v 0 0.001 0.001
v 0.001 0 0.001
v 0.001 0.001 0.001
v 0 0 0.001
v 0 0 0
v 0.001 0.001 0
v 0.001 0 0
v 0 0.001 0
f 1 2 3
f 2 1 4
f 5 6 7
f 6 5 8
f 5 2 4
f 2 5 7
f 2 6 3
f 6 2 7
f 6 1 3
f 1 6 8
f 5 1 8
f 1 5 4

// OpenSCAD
// t_curve — the parametric frontend, and the dedupe that keeps it finite.

// clang-format off
use <../src/uniTube.scad>;
// clang-format on

// ============================================ a helix
R = 60;
T = 2;
RISE = 40;
h = ut_curve(function(t)[R * cos(360 * T * t), R *sin(360 * T * t), RISE *T *t], n = 160);

assert(len(ut_segs(h)) == 1, "a parametric curve lowers to ONE sampled segment");
assert(ut_seg_kind(ut_segs(h)[0]) == "P", "of kind P");

// A sampled segment measures CHORDS, so it under-reads the true arclength. That
// is the honest cost of an arc-native IR and it is documented, not hidden.
true_len = sqrt(pow(2 * PI * R * T, 2) + pow(RISE * T, 2));
assert(ut_length(h) < true_len, "chords are shorter than the curve");
assert((true_len - ut_length(h)) / true_len < 0.001, str("but within 0.1% at n=160: ", ut_length(h), " vs ", true_len));

// ============================================ MANDATORY dedupe
// Two coincident consecutive samples make the tangent [0,0,0], and normalising
// that is [nan,nan,nan]. This is the exact failure in path_extrude.scad:58, and
// it fires on the most obvious thing a user does: joining two pieces that share
// an endpoint.
flat = ut_curve(function(t)[t < 0.5 ? 20 * t : 10, 0, 0], n = 20);
assert(abs(ut_length(flat) - 10) < 1e-9, str("the repeated tail collapses to one point, got ", ut_length(flat)));
fsts = ut_stations(flat);
assert(min([for (i = [0:len(fsts) - 2]) norm(ut_st_p(fsts[i + 1]) - ut_st_p(fsts[i]))]) > 1e-9,
       "STATION-1: no duplicate stations survive");
assert(max([for (s = fsts) is_num(ut_st_t(s)[0]) ? 0 : 1]) == 0, "and no tangent is NaN");

// ============================================ exact tangents when dfdt is given
// ONLY the direction of dfdt is used, but the RELATIVE SCALING of its components
// matters: OpenSCAD trig is in DEGREES, so d/dt cos(360*k*t) = -2*PI*k*sin(...).
// Dropping the 2*PI leaves every tangent ~6 degrees out while looking plausible.
he = ut_curve(function(t)[R * cos(360 * T * t), R *sin(360 * T * t), RISE *T *t],
              dfdt = function(t)[-2 * PI * T * R * sin(360 * T * t), 2 * PI *T *R *cos(360 * T * t), RISE *T], n = 160);
ae = ut_stations(he);
ac = ut_stations(h);
m = floor(len(ae) / 2);

// IN THE INTERIOR central differences are second-order accurate and agree with
// the analytic tangent almost exactly -- measured 0.006 deg at n=160.
assert(ut_turn(ut_st_t(ae[m]), ut_st_t(ac[m])) < 0.05,
       str("interior tangents should agree closely, got ", ut_turn(ut_st_t(ae[m]), ut_st_t(ac[m]))));

// AT THE ENDS there is no centre to difference about, so the estimate is
// one-sided and first-order: the error is about half a sample's rotation
// (360*T/n/2 = 2.25 deg here). Measured 2.237.
half_step = 360 * T / 160 / 2;
err0 = ut_turn(ut_st_t(ae[0]), ut_st_t(ac[0]));
assert(err0 > 0.5 && err0 < half_step * 1.1,
       str("the END tangent is the one-sided estimate, error ~", half_step, " deg, got ", err0));

// WHICH IS WHY dfdt MATTERS MOST FOR PORTS. STATION-3 wants exact terminal
// tangents, and a port frame 2.2 degrees out is ~0.8 mm of gap across a 20 mm
// flange. On a sampled path, supplying dfdt is how you get that back.
assert(abs(ut_st_t(ae[0])[0]) < 1e-9, "with dfdt the start tangent is exact: no X component at t=0");

// ============================================ frames over a sampled path
assert(max([for (s = ut_stations(h)) abs(ut_st_t(s) * ut_st_n(s))]) < 1e-9, "frames stay orthonormal");
assert(max([for (s = ut_stations(h)) abs(norm(ut_st_n(s)) - 1)]) < 1e-9, "and unit");

cube(0.001); // sentinel
